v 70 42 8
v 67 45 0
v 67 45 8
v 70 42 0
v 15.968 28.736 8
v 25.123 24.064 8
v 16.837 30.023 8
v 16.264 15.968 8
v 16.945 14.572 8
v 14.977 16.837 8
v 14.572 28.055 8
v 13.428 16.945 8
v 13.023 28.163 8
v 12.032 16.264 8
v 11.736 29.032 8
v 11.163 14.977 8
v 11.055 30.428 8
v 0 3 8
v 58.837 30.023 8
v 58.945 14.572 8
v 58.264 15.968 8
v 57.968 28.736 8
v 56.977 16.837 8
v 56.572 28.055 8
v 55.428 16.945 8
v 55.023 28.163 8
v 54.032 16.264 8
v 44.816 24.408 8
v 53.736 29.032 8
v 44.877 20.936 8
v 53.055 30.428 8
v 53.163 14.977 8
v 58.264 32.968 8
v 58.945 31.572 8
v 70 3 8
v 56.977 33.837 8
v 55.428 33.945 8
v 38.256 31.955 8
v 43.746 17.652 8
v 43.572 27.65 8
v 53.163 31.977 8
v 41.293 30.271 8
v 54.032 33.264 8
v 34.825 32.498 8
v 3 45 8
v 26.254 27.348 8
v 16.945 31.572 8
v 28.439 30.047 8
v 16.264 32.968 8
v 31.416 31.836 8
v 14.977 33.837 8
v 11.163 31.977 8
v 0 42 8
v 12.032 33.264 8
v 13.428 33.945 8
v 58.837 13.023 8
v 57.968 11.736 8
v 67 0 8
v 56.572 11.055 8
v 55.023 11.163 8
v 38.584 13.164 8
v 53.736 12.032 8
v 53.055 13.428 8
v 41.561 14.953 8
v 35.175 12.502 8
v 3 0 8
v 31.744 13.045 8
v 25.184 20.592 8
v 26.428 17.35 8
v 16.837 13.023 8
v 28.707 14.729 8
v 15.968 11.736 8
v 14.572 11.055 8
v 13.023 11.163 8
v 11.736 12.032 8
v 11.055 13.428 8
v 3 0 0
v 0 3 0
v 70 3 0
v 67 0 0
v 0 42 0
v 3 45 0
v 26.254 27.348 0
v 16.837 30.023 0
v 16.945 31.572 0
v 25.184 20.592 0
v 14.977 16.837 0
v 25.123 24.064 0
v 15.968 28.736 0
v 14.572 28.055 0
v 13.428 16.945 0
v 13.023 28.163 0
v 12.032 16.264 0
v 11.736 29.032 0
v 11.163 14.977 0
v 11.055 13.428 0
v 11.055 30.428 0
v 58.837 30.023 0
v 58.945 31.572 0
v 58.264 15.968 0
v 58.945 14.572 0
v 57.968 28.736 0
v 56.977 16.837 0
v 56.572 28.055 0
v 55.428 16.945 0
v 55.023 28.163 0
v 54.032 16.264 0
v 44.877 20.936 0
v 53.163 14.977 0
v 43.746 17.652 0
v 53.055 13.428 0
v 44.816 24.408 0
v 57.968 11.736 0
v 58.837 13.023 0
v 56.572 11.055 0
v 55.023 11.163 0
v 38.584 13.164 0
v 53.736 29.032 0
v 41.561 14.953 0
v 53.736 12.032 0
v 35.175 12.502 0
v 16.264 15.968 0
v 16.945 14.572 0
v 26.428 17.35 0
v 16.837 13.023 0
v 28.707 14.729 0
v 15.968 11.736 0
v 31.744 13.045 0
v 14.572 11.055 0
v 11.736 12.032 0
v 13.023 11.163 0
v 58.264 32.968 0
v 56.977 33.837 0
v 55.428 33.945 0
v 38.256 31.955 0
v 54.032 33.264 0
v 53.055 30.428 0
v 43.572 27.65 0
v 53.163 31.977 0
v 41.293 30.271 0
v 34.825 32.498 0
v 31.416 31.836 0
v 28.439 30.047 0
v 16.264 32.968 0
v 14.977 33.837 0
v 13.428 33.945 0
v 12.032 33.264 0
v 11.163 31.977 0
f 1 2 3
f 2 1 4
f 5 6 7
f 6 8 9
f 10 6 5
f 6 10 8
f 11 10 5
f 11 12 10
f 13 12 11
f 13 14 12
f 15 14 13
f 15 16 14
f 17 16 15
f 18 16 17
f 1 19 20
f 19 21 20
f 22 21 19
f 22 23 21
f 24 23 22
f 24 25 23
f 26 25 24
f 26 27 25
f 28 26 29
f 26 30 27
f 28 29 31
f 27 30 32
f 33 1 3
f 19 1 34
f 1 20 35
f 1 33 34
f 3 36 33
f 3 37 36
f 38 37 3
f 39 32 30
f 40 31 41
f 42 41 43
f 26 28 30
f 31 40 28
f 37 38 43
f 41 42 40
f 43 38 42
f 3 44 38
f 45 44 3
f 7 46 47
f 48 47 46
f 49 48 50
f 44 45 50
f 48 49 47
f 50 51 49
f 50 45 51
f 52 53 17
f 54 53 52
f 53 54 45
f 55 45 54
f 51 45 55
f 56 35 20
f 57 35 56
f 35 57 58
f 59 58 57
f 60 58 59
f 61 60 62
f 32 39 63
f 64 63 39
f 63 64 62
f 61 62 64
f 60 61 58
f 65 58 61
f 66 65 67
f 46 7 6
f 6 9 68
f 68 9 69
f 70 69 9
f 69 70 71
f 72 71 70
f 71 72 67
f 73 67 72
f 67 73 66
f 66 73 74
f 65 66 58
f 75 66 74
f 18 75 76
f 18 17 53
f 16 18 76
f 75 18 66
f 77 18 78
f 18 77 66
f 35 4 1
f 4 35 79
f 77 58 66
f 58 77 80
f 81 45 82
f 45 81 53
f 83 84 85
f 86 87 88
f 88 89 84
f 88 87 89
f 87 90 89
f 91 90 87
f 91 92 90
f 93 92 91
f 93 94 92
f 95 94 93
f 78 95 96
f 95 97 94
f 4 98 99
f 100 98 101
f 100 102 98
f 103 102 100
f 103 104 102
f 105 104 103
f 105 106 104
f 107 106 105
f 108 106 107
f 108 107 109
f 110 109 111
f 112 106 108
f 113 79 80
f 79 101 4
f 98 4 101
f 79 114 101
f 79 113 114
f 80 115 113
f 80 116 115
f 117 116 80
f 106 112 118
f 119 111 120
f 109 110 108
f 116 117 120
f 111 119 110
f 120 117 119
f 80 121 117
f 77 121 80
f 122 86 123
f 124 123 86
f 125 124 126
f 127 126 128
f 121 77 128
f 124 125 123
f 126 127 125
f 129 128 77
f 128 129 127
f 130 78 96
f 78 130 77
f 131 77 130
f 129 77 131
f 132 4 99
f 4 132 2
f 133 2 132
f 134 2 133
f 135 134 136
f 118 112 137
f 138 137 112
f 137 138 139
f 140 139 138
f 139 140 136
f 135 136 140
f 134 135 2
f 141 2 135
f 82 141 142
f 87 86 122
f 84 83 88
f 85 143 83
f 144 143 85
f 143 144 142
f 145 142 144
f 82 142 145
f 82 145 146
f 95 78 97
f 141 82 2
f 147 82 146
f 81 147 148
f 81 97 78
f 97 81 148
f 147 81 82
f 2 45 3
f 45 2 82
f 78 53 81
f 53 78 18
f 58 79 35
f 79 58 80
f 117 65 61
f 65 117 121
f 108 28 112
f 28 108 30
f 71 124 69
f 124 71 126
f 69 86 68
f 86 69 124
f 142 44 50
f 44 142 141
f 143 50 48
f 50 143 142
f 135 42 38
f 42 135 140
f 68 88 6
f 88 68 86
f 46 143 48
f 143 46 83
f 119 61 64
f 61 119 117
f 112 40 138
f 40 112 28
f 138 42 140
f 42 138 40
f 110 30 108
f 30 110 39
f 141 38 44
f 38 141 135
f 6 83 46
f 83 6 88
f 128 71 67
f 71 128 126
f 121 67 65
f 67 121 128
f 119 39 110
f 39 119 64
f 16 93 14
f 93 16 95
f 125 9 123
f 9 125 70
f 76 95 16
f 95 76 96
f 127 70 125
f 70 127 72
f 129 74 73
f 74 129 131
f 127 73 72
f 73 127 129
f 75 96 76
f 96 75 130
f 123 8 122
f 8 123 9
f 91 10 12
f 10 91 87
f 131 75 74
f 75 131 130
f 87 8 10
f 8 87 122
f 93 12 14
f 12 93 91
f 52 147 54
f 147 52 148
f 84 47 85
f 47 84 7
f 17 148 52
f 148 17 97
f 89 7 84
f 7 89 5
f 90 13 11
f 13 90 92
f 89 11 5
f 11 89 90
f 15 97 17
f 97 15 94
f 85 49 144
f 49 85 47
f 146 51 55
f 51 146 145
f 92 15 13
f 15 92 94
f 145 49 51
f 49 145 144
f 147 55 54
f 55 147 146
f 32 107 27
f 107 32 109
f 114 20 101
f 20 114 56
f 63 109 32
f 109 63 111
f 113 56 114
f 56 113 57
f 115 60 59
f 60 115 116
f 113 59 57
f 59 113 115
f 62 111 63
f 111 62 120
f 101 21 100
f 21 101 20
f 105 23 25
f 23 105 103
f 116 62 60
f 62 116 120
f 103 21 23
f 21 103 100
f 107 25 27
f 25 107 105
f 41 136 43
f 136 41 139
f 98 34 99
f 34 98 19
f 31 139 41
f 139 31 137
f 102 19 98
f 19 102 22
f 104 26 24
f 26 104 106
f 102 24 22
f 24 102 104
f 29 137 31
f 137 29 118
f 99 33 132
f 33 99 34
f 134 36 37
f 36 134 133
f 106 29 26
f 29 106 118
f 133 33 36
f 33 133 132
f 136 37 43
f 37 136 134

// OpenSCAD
$fn = 32;

// ----------------------------------------------------------------------
// Spacer plate: rect 70 x 45
// ----------------------------------------------------------------------

// --- parameters (mm) ---
bore_r = 10;              // centre bore radius
bolt_r = 3;               // bolt hole radius
plate_t = 8;              // plate thickness, Z (extrusion height)
plate_l = 70;             // plate length, X
plate_w = 45;             // plate width, Y
inset = 14;               // corner hole inset

profile = [[3, 0], [67, 0], [70, 3], [70, 42], [67, 45], [3, 45], [0, 42], [0, 3]];  // primary outline, 8 points, counter clockwise
void_1 = [[44.816, 24.408], [43.572, 27.65], [41.293, 30.271], [38.256, 31.955], [34.825, 32.498], [31.416, 31.836], [28.439, 30.047], [26.254, 27.348], [25.123, 24.064], [25.184, 20.592], [26.428, 17.35], [28.707, 14.729], [31.744, 13.045], [35.175, 12.502], [38.584, 13.164], [41.561, 14.953], [43.746, 17.652], [44.877, 20.936]];  // centre bore, 18 points
void_2 = [[16.945, 14.572], [16.264, 15.968], [14.977, 16.837], [13.428, 16.945], [12.032, 16.264], [11.163, 14.977], [11.055, 13.428], [11.736, 12.032], [13.023, 11.163], [14.572, 11.055], [15.968, 11.736], [16.837, 13.023]];  // corner hole, 12 points
void_3 = [[16.945, 31.572], [16.264, 32.968], [14.977, 33.837], [13.428, 33.945], [12.032, 33.264], [11.163, 31.977], [11.055, 30.428], [11.736, 29.032], [13.023, 28.163], [14.572, 28.055], [15.968, 28.736], [16.837, 30.023]];  // corner hole, 12 points
void_4 = [[58.945, 14.572], [58.264, 15.968], [56.977, 16.837], [55.428, 16.945], [54.032, 16.264], [53.163, 14.977], [53.055, 13.428], [53.736, 12.032], [55.023, 11.163], [56.572, 11.055], [57.968, 11.736], [58.837, 13.023]];  // corner hole, 12 points
void_5 = [[58.945, 31.572], [58.264, 32.968], [56.977, 33.837], [55.428, 33.945], [54.032, 33.264], [53.163, 31.977], [53.055, 30.428], [53.736, 29.032], [55.023, 28.163], [56.572, 28.055], [57.968, 28.736], [58.837, 30.023]];  // corner hole, 12 points

// --- the one profile operation ---
difference() {
  linear_extrude(height = plate_t) polygon(points = profile);
  translate([0, 0, -1])
    linear_extrude(height = plate_t + 2) polygon(points = void_1);
  translate([0, 0, -1])
    linear_extrude(height = plate_t + 2) polygon(points = void_2);
  translate([0, 0, -1])
    linear_extrude(height = plate_t + 2) polygon(points = void_3);
  translate([0, 0, -1])
    linear_extrude(height = plate_t + 2) polygon(points = void_4);
  translate([0, 0, -1])
    linear_extrude(height = plate_t + 2) polygon(points = void_5);
}
